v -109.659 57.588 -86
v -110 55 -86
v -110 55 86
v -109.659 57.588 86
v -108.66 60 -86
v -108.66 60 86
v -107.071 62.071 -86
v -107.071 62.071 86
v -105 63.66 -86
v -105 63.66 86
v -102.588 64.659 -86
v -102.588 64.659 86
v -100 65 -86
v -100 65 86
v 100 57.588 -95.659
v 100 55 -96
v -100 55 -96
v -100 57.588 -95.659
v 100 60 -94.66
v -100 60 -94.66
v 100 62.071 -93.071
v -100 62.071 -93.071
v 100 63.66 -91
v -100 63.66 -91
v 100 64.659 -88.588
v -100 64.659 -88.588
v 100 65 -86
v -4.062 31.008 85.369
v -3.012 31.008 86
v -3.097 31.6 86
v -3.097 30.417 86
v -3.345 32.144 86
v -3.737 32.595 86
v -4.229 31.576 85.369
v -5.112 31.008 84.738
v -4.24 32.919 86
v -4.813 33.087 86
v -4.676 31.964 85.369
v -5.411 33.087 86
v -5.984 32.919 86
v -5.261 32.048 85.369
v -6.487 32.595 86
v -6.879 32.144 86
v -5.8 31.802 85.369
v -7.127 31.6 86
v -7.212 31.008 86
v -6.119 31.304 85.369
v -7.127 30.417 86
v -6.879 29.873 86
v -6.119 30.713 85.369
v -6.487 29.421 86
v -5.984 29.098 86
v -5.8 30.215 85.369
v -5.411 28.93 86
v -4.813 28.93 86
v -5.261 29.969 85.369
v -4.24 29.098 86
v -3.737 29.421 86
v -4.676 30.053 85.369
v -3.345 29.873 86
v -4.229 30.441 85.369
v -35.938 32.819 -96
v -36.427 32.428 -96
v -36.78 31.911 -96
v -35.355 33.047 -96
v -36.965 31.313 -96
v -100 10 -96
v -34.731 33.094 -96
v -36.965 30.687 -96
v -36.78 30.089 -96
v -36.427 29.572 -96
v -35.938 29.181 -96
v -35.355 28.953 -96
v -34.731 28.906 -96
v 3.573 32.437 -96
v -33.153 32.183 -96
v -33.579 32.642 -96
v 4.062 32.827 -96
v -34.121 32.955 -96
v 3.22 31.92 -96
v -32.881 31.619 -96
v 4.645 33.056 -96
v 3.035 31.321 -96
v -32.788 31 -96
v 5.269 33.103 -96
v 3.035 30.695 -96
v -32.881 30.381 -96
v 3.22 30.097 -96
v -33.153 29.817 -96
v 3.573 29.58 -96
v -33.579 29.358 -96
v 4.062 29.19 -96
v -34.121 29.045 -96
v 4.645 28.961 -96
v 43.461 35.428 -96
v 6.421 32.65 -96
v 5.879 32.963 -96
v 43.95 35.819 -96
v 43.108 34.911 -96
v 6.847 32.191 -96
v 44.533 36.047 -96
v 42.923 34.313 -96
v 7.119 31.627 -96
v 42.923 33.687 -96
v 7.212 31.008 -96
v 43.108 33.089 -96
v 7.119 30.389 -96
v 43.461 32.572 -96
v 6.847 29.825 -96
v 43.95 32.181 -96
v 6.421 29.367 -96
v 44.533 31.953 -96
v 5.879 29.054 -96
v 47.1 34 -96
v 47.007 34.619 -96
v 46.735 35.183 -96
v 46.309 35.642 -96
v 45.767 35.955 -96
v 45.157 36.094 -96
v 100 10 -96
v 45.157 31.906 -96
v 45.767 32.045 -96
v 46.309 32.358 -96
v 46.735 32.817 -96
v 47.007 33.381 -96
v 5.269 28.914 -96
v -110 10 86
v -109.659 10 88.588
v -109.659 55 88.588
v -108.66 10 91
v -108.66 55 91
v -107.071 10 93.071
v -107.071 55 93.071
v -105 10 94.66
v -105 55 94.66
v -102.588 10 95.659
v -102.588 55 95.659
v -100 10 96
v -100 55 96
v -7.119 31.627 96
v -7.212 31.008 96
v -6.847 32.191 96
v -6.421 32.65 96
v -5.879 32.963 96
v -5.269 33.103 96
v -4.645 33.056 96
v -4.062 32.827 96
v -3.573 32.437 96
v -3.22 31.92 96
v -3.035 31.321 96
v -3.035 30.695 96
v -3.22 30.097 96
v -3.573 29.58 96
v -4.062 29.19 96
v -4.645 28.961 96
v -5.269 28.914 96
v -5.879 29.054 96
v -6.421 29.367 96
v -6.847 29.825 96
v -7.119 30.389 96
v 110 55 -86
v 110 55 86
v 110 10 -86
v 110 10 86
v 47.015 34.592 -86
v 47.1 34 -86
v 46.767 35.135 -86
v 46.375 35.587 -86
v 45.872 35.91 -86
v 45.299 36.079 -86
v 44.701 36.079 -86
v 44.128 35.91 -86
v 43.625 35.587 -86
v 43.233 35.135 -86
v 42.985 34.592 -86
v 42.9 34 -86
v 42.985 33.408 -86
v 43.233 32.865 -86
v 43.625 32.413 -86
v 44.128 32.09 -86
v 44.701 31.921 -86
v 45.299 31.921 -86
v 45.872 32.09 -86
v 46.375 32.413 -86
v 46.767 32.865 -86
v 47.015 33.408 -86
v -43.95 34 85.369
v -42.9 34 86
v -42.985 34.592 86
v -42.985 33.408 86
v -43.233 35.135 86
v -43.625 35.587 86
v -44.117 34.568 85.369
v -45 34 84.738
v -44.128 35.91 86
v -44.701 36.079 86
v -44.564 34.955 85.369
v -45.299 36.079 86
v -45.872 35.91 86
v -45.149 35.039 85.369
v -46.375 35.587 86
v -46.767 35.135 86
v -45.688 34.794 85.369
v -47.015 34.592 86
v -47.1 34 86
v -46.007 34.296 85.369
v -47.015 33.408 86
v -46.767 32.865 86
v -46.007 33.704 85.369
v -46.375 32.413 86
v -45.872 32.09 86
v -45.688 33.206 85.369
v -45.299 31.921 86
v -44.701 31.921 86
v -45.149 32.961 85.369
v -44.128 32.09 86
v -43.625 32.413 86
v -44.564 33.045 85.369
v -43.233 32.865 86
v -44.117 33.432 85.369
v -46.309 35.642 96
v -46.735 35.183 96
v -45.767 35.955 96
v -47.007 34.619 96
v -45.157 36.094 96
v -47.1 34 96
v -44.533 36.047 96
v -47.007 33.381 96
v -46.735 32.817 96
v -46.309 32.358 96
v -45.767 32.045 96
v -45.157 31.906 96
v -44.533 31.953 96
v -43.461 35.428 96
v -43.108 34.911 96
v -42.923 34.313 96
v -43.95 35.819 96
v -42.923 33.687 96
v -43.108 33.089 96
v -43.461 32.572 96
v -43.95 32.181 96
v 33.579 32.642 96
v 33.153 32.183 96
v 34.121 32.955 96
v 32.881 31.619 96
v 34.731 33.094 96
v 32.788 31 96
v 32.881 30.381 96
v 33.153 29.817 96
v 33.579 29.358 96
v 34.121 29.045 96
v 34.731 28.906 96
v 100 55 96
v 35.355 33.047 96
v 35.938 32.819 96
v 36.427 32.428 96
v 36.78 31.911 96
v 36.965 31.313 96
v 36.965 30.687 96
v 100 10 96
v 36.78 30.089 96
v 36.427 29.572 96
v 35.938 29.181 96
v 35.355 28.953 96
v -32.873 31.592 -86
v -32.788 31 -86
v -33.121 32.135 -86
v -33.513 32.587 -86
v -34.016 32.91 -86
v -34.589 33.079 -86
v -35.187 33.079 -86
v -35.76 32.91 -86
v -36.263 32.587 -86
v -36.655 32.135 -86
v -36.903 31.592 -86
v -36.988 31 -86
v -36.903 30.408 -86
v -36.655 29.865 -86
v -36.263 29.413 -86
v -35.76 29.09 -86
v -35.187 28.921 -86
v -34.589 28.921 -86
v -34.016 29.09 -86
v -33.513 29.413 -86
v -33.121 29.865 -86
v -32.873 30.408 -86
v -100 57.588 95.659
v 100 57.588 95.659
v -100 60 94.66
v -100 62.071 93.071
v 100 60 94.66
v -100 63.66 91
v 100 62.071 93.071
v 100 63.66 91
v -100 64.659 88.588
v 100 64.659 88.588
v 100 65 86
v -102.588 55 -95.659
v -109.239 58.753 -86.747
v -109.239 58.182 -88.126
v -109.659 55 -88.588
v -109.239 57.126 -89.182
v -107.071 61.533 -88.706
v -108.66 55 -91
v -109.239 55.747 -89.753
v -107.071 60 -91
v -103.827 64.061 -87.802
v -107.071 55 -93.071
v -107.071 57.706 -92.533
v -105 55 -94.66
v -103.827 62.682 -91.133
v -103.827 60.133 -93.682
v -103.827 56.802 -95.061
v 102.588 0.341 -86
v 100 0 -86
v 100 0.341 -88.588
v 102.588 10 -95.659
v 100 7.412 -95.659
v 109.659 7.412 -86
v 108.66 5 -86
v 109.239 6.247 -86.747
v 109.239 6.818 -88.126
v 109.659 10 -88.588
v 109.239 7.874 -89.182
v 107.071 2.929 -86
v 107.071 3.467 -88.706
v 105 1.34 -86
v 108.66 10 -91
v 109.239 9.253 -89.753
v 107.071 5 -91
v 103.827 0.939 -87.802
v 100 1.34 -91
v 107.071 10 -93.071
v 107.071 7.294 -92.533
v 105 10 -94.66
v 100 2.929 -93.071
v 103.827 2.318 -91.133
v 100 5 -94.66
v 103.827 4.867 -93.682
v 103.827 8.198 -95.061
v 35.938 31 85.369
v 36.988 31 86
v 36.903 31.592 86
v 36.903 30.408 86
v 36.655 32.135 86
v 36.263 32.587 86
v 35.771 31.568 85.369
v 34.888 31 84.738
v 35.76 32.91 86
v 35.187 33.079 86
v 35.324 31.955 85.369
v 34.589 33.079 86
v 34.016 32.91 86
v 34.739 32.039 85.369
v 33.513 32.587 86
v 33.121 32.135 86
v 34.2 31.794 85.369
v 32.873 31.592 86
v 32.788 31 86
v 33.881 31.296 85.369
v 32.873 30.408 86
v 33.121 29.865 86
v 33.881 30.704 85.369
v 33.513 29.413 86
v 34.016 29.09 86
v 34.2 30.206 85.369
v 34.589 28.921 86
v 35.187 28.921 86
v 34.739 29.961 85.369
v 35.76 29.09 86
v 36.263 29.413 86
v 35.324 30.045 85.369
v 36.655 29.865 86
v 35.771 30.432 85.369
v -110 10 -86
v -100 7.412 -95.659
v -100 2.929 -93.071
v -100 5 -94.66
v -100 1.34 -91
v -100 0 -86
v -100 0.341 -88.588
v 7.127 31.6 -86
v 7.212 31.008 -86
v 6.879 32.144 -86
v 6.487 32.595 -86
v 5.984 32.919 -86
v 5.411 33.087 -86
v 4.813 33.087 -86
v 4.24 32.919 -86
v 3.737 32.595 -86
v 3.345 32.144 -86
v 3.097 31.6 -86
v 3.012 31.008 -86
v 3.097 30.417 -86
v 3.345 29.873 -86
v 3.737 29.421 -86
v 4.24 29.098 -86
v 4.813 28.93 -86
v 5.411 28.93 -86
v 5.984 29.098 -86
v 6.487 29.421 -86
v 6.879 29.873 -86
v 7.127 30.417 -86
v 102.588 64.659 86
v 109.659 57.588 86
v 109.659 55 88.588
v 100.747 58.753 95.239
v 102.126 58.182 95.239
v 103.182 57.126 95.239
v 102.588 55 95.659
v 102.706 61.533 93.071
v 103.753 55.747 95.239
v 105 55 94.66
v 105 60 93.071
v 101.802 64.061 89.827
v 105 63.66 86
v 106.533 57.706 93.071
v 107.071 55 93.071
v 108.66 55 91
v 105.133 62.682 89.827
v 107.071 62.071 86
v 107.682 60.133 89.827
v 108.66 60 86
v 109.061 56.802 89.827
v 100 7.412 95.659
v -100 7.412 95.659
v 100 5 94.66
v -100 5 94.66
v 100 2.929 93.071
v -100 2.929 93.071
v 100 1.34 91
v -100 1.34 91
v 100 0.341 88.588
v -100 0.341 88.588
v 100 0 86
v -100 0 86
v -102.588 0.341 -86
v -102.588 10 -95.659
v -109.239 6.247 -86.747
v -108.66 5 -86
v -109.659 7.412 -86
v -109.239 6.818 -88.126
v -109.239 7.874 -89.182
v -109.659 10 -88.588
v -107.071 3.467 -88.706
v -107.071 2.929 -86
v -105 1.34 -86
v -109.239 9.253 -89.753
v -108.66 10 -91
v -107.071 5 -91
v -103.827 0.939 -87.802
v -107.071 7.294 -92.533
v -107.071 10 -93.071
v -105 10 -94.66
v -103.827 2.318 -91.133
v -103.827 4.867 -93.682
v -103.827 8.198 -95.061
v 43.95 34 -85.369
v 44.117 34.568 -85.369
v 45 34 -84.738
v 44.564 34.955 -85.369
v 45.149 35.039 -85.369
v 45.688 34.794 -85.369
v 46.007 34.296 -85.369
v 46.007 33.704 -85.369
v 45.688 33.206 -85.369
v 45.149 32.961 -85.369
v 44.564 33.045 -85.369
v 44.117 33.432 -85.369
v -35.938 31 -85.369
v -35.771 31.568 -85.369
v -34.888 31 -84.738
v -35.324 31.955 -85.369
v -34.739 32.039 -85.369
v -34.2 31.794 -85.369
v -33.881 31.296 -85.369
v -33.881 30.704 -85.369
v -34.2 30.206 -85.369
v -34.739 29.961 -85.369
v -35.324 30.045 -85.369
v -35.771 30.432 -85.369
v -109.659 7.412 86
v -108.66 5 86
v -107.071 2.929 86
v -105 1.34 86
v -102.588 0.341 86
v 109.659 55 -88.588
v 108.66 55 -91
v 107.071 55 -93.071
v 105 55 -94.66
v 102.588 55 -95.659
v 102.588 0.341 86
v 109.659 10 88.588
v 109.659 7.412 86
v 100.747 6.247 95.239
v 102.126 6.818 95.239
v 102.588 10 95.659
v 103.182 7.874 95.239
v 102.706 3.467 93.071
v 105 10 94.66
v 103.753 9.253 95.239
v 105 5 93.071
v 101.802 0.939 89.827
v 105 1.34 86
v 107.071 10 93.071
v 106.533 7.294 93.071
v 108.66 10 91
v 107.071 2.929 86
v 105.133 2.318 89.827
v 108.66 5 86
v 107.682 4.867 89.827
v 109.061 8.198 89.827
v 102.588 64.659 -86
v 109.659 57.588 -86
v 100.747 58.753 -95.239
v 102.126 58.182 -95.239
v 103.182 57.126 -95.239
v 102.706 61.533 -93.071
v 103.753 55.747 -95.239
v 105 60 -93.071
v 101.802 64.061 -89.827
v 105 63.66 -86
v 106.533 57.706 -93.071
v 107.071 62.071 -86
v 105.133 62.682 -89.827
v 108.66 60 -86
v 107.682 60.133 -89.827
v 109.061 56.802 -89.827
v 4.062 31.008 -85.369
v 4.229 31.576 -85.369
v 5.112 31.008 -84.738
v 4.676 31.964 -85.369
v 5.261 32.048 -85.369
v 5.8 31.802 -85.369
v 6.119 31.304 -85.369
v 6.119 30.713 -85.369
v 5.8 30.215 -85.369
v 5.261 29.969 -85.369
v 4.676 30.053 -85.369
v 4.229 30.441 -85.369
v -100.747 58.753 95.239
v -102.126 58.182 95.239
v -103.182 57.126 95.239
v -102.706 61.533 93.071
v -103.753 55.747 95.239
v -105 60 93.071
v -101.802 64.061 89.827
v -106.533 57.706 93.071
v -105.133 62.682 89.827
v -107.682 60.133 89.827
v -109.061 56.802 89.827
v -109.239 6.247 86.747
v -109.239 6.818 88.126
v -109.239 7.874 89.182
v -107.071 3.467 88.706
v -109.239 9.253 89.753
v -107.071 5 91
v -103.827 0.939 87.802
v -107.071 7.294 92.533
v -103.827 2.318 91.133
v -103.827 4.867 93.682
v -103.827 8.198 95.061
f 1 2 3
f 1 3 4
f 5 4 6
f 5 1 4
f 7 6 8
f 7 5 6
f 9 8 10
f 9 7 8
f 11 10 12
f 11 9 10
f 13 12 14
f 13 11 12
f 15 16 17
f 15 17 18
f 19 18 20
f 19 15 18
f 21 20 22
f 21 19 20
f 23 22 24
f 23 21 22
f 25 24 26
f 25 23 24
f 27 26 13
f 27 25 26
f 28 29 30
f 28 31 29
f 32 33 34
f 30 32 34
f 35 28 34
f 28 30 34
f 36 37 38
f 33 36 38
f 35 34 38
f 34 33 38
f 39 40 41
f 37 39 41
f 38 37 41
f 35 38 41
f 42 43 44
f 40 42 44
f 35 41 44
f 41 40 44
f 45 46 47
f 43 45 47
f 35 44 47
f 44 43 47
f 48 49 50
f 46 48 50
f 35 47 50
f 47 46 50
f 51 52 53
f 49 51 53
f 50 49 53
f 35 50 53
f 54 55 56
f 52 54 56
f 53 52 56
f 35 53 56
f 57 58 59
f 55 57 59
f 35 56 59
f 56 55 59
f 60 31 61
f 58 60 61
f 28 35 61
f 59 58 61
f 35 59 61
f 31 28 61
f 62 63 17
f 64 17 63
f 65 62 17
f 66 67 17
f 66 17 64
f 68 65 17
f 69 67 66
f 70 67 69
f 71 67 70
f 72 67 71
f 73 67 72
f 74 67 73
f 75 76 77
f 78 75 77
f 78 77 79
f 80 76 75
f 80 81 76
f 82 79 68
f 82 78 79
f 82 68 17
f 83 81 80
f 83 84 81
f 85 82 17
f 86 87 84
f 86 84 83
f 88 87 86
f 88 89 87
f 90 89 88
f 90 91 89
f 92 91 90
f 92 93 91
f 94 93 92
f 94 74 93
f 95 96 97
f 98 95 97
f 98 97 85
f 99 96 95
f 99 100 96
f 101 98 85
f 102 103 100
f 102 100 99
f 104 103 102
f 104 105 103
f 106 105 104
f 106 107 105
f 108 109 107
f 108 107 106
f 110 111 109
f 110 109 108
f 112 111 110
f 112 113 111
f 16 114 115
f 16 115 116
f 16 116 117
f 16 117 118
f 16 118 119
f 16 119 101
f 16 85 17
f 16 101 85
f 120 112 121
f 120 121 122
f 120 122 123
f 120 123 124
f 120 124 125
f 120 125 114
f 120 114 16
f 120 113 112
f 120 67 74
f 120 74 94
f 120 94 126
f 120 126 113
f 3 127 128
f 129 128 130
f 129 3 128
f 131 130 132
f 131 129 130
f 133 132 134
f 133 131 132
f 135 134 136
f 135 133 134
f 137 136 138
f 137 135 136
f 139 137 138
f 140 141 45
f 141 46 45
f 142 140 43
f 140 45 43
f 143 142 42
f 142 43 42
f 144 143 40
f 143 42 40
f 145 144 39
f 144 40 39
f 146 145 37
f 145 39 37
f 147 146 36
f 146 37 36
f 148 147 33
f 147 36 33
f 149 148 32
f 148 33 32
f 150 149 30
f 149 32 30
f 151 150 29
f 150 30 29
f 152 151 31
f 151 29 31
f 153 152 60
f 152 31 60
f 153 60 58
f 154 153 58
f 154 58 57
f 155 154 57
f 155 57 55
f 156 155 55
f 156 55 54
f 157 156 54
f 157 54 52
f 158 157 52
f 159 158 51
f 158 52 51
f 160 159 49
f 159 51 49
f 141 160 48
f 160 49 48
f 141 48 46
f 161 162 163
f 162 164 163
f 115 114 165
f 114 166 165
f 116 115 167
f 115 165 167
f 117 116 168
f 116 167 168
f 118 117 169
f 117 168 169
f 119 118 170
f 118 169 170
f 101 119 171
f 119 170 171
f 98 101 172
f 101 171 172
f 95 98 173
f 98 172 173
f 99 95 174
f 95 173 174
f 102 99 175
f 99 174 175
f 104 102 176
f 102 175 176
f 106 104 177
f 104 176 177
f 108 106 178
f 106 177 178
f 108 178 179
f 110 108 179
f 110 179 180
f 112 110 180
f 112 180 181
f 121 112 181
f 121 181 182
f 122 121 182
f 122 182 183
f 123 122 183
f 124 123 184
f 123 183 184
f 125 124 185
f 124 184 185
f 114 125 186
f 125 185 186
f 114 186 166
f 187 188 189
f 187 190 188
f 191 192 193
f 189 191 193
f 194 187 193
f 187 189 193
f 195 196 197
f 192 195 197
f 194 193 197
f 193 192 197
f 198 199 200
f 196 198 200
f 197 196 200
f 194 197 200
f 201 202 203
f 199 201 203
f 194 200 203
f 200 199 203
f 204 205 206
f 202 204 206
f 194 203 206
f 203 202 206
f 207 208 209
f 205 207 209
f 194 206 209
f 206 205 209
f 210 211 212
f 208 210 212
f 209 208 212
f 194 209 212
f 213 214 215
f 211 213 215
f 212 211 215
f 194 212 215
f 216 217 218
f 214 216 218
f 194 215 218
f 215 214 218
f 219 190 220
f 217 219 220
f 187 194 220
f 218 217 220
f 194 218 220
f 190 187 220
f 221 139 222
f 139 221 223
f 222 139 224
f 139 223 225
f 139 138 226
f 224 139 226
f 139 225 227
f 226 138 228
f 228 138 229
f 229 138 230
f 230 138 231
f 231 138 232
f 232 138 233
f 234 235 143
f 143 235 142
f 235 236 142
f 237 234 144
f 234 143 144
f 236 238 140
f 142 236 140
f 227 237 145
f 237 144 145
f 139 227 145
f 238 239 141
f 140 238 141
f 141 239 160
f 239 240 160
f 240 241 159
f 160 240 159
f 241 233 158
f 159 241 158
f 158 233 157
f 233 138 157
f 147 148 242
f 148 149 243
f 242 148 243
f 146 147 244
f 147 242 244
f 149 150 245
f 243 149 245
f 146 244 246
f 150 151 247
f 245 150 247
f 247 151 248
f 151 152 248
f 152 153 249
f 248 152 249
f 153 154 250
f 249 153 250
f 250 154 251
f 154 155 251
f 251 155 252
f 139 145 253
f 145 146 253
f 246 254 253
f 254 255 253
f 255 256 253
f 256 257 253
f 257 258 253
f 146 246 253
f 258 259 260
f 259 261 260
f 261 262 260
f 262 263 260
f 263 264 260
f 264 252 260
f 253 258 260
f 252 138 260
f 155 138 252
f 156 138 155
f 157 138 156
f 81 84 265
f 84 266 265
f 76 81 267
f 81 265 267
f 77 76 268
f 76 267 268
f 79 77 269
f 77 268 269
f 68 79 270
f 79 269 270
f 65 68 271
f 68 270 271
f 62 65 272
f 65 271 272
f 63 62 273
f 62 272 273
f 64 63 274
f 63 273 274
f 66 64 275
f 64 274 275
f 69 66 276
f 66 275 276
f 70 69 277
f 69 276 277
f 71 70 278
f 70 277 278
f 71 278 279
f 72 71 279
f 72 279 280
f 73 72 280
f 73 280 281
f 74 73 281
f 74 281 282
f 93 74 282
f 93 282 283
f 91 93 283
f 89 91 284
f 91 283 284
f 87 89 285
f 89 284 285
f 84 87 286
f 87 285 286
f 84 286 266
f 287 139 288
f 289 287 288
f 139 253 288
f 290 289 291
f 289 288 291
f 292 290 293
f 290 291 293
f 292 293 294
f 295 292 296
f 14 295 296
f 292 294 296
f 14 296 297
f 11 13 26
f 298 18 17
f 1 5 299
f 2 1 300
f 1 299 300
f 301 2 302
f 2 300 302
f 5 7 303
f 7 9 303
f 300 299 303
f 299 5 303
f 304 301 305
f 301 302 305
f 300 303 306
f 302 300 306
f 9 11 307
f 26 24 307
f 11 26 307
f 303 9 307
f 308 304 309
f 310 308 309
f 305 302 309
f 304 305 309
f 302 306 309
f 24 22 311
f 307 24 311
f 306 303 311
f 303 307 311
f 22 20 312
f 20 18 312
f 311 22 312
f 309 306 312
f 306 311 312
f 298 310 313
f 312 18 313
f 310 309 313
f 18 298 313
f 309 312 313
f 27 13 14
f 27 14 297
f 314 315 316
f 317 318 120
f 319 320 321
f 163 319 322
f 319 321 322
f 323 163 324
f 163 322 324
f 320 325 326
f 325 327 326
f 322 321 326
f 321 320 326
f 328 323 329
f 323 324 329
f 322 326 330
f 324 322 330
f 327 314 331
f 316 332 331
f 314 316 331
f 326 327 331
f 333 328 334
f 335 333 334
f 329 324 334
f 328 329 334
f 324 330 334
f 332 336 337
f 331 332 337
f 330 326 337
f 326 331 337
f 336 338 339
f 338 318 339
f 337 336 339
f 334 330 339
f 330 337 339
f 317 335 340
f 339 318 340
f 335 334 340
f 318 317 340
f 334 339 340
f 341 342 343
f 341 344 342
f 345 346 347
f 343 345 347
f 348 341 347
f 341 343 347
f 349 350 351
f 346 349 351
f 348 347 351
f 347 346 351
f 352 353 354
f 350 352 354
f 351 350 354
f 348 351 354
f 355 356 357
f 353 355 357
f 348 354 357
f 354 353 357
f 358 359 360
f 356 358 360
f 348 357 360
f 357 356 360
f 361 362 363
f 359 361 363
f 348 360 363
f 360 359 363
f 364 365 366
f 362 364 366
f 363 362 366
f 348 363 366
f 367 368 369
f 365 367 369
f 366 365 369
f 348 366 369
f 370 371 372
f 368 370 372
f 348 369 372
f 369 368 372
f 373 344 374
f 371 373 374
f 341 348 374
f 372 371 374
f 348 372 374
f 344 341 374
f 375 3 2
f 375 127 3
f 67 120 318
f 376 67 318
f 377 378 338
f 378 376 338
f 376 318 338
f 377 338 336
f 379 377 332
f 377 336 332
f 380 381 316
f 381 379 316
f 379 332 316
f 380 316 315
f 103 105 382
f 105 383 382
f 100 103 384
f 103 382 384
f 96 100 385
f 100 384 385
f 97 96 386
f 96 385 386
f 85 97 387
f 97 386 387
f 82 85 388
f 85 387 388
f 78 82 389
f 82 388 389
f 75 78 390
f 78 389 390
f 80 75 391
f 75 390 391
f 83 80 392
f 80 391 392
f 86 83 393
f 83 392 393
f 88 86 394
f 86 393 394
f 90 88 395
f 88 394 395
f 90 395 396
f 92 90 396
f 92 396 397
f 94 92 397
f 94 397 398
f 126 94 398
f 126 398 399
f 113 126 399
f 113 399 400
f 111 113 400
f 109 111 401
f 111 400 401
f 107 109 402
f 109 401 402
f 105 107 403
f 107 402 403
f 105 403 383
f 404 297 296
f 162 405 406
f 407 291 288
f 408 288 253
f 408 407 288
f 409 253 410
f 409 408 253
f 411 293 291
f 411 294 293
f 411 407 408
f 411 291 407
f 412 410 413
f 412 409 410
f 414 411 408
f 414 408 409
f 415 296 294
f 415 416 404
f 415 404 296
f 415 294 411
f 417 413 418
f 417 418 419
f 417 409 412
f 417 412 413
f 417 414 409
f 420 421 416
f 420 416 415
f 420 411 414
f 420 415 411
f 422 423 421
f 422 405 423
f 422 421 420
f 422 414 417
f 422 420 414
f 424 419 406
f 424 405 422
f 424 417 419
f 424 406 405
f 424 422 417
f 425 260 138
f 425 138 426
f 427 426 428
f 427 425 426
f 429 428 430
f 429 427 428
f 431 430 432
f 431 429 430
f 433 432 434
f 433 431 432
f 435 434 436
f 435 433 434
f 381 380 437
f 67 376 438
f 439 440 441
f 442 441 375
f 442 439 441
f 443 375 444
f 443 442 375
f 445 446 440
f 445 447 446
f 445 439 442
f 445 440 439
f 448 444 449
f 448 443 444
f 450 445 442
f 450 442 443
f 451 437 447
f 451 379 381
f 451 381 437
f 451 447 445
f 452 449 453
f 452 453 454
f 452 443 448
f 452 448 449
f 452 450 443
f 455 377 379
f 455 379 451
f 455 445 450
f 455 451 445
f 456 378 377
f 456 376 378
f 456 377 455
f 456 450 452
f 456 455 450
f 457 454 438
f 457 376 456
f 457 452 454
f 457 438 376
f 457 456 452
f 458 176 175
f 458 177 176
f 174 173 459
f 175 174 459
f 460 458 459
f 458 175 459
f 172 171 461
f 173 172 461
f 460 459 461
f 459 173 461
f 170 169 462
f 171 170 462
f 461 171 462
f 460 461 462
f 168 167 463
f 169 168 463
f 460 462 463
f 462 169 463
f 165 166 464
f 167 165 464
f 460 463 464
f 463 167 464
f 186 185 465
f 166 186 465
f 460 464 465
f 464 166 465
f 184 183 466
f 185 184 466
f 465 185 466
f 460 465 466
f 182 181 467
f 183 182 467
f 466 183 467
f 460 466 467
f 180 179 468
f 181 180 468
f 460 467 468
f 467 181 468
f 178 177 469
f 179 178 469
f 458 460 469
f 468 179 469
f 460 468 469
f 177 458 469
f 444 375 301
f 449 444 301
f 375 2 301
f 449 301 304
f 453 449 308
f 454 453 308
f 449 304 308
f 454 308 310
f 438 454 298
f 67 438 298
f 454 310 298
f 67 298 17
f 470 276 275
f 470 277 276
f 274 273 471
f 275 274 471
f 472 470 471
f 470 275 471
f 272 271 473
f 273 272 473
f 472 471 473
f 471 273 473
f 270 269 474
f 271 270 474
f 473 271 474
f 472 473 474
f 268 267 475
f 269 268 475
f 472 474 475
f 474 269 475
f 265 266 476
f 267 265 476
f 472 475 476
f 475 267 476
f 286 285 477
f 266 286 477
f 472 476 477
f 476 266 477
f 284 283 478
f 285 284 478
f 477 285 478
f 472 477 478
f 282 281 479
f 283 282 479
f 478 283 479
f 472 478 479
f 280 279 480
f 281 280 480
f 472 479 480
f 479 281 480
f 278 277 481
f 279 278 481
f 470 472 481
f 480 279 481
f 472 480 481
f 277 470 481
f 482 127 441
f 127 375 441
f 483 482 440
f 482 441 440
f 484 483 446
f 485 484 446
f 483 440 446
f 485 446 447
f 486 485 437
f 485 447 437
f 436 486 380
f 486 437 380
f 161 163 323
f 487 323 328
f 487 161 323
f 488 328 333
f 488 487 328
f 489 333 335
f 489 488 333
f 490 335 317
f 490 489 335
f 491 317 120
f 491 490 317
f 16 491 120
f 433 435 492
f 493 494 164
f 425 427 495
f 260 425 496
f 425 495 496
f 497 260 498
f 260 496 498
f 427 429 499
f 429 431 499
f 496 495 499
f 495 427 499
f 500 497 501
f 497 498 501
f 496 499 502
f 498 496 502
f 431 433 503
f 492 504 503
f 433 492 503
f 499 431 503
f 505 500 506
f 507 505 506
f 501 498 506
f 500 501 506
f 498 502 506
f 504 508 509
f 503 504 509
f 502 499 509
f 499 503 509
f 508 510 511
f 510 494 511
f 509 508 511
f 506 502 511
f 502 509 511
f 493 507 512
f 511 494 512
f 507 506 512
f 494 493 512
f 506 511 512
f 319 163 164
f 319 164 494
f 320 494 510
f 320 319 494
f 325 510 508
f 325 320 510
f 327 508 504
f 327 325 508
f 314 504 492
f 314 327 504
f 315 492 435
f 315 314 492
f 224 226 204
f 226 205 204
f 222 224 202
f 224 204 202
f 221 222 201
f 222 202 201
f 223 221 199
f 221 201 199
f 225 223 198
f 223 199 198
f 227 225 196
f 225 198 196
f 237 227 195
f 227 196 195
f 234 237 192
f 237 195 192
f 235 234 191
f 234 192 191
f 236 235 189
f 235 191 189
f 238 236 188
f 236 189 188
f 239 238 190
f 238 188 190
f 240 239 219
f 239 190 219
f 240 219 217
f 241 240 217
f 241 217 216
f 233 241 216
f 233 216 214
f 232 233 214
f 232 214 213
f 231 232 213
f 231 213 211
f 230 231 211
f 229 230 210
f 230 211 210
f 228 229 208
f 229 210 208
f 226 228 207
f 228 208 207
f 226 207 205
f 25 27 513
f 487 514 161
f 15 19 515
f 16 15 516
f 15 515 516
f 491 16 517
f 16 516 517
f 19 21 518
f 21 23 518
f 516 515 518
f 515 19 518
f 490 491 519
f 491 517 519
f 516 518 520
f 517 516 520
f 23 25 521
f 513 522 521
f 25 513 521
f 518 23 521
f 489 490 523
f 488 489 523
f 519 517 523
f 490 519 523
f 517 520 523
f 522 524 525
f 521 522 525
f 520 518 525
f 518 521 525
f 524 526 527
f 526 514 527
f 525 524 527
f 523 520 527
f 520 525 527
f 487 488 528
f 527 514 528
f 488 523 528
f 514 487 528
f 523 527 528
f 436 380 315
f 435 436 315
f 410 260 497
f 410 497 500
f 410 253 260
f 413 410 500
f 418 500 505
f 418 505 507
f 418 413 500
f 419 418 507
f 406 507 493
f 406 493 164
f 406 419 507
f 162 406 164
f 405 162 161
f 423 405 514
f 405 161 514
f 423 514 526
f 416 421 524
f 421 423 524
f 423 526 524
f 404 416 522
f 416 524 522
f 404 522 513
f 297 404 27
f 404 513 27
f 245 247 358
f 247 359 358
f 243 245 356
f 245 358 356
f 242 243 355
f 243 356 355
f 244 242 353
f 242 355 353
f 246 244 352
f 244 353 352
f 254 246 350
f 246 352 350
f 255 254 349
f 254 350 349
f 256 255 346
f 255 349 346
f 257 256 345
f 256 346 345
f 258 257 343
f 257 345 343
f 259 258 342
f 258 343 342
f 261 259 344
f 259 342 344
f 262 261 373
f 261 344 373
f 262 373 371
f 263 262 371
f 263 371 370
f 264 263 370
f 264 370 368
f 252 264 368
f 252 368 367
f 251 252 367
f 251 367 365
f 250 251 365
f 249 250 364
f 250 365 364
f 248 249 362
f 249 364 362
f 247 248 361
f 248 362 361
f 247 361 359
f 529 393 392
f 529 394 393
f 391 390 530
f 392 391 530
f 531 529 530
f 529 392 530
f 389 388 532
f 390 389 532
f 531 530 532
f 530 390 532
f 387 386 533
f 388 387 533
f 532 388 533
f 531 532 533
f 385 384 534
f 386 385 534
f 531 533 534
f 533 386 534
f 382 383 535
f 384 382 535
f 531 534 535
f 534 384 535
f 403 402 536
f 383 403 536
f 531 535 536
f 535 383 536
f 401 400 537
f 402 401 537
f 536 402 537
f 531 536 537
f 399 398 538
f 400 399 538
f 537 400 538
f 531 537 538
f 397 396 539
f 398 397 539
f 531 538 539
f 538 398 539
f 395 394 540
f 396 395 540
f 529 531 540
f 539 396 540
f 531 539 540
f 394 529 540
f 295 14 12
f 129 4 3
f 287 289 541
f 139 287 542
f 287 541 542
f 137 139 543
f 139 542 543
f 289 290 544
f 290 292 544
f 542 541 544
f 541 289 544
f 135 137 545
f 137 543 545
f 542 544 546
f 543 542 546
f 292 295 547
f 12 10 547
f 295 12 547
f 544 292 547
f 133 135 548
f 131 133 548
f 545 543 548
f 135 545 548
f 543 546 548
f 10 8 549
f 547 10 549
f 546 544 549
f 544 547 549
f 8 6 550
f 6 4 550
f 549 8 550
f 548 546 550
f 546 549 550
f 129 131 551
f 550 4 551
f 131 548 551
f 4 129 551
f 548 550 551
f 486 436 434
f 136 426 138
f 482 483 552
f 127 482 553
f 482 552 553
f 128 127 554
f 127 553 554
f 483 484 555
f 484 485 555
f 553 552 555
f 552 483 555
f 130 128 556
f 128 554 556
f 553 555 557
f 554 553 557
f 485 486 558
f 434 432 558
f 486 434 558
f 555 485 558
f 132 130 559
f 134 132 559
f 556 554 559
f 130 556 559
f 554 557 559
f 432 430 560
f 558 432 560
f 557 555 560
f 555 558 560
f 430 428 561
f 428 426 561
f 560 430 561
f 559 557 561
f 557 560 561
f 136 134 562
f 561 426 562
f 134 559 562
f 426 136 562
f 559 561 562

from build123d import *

# Parameters (mm, degrees)
SKETCH1_W                      = 220
SKETCH1_H                      = 192
BOSS_EXTRUDE1_DEPTH            = 65
FILLET1_R                      = 10
F_4_2_4_2_DIAMETER_HOLE1_D     = 4.2
F_4_2_4_2_DIAMETER_HOLE1_DEPTH = 10
F_4_2_4_2_DIAMETER_HOLE1_TIP   = 1.2618073
F_4_2_4_2_DIAMETER_HOLE2_D     = 4.2
F_4_2_4_2_DIAMETER_HOLE2_DEPTH = 10
F_4_2_4_2_DIAMETER_HOLE2_TIP   = 1.2618073


with BuildPart() as part:
    # Sketch1 → Boss-Extrude1 (new body)
    with BuildSketch(Plane(origin=(0, 0, 0), x_dir=(1, 0, 0), z_dir=(0, 1, 0))):
        Rectangle(SKETCH1_W, SKETCH1_H)
    extrude(amount=BOSS_EXTRUDE1_DEPTH)

    # Fillet1
    fillet1_edges = [part.edges().sort_by_distance(p)[0] for p in [
        (110, 65, 0),
        (0, 65, -96),
        (-110, 65, 0),
        (0, 0, -96),
        (110, 0, 0),
        (0, 0, 96),
        (-110, 0, 0),
        (0, 65, 96),
        (-110, 32.5, -96),
        (110, 32.5, -96),
        (110, 32.5, 96),
        (-110, 32.5, 96),
    ]]
    fillet(fillet1_edges, radius=FILLET1_R)

    # Ø4.2 (4.2) Diameter Hole1
    with Locations(Plane.XY.offset(96)):
        with Locations((-45, 34), (-5.112027604, 31.00840207), (34.887971518, 31.000023466)):
            Hole(F_4_2_4_2_DIAMETER_HOLE1_D / 2, depth=F_4_2_4_2_DIAMETER_HOLE1_DEPTH)
            with Locations((0, 0, -(F_4_2_4_2_DIAMETER_HOLE1_DEPTH + F_4_2_4_2_DIAMETER_HOLE1_TIP / 2))):  # 118° drill point
                Cone(0, F_4_2_4_2_DIAMETER_HOLE1_D / 2, F_4_2_4_2_DIAMETER_HOLE1_TIP, mode=Mode.SUBTRACT)

    # Ø4.2 (4.2) Diameter Hole2
    with Locations(Plane(origin=(0, 0, -96), x_dir=(-1, 0, 0), z_dir=(0, 0, -1))):
        with Locations((-45, 34), (-5.112027604, 31.00840207), (34.887971518, 31.000023466)):
            Hole(F_4_2_4_2_DIAMETER_HOLE2_D / 2, depth=F_4_2_4_2_DIAMETER_HOLE2_DEPTH)
            with Locations((0, 0, -(F_4_2_4_2_DIAMETER_HOLE2_DEPTH + F_4_2_4_2_DIAMETER_HOLE2_TIP / 2))):  # 118° drill point
                Cone(0, F_4_2_4_2_DIAMETER_HOLE2_D / 2, F_4_2_4_2_DIAMETER_HOLE2_TIP, mode=Mode.SUBTRACT)


solid = part.part
